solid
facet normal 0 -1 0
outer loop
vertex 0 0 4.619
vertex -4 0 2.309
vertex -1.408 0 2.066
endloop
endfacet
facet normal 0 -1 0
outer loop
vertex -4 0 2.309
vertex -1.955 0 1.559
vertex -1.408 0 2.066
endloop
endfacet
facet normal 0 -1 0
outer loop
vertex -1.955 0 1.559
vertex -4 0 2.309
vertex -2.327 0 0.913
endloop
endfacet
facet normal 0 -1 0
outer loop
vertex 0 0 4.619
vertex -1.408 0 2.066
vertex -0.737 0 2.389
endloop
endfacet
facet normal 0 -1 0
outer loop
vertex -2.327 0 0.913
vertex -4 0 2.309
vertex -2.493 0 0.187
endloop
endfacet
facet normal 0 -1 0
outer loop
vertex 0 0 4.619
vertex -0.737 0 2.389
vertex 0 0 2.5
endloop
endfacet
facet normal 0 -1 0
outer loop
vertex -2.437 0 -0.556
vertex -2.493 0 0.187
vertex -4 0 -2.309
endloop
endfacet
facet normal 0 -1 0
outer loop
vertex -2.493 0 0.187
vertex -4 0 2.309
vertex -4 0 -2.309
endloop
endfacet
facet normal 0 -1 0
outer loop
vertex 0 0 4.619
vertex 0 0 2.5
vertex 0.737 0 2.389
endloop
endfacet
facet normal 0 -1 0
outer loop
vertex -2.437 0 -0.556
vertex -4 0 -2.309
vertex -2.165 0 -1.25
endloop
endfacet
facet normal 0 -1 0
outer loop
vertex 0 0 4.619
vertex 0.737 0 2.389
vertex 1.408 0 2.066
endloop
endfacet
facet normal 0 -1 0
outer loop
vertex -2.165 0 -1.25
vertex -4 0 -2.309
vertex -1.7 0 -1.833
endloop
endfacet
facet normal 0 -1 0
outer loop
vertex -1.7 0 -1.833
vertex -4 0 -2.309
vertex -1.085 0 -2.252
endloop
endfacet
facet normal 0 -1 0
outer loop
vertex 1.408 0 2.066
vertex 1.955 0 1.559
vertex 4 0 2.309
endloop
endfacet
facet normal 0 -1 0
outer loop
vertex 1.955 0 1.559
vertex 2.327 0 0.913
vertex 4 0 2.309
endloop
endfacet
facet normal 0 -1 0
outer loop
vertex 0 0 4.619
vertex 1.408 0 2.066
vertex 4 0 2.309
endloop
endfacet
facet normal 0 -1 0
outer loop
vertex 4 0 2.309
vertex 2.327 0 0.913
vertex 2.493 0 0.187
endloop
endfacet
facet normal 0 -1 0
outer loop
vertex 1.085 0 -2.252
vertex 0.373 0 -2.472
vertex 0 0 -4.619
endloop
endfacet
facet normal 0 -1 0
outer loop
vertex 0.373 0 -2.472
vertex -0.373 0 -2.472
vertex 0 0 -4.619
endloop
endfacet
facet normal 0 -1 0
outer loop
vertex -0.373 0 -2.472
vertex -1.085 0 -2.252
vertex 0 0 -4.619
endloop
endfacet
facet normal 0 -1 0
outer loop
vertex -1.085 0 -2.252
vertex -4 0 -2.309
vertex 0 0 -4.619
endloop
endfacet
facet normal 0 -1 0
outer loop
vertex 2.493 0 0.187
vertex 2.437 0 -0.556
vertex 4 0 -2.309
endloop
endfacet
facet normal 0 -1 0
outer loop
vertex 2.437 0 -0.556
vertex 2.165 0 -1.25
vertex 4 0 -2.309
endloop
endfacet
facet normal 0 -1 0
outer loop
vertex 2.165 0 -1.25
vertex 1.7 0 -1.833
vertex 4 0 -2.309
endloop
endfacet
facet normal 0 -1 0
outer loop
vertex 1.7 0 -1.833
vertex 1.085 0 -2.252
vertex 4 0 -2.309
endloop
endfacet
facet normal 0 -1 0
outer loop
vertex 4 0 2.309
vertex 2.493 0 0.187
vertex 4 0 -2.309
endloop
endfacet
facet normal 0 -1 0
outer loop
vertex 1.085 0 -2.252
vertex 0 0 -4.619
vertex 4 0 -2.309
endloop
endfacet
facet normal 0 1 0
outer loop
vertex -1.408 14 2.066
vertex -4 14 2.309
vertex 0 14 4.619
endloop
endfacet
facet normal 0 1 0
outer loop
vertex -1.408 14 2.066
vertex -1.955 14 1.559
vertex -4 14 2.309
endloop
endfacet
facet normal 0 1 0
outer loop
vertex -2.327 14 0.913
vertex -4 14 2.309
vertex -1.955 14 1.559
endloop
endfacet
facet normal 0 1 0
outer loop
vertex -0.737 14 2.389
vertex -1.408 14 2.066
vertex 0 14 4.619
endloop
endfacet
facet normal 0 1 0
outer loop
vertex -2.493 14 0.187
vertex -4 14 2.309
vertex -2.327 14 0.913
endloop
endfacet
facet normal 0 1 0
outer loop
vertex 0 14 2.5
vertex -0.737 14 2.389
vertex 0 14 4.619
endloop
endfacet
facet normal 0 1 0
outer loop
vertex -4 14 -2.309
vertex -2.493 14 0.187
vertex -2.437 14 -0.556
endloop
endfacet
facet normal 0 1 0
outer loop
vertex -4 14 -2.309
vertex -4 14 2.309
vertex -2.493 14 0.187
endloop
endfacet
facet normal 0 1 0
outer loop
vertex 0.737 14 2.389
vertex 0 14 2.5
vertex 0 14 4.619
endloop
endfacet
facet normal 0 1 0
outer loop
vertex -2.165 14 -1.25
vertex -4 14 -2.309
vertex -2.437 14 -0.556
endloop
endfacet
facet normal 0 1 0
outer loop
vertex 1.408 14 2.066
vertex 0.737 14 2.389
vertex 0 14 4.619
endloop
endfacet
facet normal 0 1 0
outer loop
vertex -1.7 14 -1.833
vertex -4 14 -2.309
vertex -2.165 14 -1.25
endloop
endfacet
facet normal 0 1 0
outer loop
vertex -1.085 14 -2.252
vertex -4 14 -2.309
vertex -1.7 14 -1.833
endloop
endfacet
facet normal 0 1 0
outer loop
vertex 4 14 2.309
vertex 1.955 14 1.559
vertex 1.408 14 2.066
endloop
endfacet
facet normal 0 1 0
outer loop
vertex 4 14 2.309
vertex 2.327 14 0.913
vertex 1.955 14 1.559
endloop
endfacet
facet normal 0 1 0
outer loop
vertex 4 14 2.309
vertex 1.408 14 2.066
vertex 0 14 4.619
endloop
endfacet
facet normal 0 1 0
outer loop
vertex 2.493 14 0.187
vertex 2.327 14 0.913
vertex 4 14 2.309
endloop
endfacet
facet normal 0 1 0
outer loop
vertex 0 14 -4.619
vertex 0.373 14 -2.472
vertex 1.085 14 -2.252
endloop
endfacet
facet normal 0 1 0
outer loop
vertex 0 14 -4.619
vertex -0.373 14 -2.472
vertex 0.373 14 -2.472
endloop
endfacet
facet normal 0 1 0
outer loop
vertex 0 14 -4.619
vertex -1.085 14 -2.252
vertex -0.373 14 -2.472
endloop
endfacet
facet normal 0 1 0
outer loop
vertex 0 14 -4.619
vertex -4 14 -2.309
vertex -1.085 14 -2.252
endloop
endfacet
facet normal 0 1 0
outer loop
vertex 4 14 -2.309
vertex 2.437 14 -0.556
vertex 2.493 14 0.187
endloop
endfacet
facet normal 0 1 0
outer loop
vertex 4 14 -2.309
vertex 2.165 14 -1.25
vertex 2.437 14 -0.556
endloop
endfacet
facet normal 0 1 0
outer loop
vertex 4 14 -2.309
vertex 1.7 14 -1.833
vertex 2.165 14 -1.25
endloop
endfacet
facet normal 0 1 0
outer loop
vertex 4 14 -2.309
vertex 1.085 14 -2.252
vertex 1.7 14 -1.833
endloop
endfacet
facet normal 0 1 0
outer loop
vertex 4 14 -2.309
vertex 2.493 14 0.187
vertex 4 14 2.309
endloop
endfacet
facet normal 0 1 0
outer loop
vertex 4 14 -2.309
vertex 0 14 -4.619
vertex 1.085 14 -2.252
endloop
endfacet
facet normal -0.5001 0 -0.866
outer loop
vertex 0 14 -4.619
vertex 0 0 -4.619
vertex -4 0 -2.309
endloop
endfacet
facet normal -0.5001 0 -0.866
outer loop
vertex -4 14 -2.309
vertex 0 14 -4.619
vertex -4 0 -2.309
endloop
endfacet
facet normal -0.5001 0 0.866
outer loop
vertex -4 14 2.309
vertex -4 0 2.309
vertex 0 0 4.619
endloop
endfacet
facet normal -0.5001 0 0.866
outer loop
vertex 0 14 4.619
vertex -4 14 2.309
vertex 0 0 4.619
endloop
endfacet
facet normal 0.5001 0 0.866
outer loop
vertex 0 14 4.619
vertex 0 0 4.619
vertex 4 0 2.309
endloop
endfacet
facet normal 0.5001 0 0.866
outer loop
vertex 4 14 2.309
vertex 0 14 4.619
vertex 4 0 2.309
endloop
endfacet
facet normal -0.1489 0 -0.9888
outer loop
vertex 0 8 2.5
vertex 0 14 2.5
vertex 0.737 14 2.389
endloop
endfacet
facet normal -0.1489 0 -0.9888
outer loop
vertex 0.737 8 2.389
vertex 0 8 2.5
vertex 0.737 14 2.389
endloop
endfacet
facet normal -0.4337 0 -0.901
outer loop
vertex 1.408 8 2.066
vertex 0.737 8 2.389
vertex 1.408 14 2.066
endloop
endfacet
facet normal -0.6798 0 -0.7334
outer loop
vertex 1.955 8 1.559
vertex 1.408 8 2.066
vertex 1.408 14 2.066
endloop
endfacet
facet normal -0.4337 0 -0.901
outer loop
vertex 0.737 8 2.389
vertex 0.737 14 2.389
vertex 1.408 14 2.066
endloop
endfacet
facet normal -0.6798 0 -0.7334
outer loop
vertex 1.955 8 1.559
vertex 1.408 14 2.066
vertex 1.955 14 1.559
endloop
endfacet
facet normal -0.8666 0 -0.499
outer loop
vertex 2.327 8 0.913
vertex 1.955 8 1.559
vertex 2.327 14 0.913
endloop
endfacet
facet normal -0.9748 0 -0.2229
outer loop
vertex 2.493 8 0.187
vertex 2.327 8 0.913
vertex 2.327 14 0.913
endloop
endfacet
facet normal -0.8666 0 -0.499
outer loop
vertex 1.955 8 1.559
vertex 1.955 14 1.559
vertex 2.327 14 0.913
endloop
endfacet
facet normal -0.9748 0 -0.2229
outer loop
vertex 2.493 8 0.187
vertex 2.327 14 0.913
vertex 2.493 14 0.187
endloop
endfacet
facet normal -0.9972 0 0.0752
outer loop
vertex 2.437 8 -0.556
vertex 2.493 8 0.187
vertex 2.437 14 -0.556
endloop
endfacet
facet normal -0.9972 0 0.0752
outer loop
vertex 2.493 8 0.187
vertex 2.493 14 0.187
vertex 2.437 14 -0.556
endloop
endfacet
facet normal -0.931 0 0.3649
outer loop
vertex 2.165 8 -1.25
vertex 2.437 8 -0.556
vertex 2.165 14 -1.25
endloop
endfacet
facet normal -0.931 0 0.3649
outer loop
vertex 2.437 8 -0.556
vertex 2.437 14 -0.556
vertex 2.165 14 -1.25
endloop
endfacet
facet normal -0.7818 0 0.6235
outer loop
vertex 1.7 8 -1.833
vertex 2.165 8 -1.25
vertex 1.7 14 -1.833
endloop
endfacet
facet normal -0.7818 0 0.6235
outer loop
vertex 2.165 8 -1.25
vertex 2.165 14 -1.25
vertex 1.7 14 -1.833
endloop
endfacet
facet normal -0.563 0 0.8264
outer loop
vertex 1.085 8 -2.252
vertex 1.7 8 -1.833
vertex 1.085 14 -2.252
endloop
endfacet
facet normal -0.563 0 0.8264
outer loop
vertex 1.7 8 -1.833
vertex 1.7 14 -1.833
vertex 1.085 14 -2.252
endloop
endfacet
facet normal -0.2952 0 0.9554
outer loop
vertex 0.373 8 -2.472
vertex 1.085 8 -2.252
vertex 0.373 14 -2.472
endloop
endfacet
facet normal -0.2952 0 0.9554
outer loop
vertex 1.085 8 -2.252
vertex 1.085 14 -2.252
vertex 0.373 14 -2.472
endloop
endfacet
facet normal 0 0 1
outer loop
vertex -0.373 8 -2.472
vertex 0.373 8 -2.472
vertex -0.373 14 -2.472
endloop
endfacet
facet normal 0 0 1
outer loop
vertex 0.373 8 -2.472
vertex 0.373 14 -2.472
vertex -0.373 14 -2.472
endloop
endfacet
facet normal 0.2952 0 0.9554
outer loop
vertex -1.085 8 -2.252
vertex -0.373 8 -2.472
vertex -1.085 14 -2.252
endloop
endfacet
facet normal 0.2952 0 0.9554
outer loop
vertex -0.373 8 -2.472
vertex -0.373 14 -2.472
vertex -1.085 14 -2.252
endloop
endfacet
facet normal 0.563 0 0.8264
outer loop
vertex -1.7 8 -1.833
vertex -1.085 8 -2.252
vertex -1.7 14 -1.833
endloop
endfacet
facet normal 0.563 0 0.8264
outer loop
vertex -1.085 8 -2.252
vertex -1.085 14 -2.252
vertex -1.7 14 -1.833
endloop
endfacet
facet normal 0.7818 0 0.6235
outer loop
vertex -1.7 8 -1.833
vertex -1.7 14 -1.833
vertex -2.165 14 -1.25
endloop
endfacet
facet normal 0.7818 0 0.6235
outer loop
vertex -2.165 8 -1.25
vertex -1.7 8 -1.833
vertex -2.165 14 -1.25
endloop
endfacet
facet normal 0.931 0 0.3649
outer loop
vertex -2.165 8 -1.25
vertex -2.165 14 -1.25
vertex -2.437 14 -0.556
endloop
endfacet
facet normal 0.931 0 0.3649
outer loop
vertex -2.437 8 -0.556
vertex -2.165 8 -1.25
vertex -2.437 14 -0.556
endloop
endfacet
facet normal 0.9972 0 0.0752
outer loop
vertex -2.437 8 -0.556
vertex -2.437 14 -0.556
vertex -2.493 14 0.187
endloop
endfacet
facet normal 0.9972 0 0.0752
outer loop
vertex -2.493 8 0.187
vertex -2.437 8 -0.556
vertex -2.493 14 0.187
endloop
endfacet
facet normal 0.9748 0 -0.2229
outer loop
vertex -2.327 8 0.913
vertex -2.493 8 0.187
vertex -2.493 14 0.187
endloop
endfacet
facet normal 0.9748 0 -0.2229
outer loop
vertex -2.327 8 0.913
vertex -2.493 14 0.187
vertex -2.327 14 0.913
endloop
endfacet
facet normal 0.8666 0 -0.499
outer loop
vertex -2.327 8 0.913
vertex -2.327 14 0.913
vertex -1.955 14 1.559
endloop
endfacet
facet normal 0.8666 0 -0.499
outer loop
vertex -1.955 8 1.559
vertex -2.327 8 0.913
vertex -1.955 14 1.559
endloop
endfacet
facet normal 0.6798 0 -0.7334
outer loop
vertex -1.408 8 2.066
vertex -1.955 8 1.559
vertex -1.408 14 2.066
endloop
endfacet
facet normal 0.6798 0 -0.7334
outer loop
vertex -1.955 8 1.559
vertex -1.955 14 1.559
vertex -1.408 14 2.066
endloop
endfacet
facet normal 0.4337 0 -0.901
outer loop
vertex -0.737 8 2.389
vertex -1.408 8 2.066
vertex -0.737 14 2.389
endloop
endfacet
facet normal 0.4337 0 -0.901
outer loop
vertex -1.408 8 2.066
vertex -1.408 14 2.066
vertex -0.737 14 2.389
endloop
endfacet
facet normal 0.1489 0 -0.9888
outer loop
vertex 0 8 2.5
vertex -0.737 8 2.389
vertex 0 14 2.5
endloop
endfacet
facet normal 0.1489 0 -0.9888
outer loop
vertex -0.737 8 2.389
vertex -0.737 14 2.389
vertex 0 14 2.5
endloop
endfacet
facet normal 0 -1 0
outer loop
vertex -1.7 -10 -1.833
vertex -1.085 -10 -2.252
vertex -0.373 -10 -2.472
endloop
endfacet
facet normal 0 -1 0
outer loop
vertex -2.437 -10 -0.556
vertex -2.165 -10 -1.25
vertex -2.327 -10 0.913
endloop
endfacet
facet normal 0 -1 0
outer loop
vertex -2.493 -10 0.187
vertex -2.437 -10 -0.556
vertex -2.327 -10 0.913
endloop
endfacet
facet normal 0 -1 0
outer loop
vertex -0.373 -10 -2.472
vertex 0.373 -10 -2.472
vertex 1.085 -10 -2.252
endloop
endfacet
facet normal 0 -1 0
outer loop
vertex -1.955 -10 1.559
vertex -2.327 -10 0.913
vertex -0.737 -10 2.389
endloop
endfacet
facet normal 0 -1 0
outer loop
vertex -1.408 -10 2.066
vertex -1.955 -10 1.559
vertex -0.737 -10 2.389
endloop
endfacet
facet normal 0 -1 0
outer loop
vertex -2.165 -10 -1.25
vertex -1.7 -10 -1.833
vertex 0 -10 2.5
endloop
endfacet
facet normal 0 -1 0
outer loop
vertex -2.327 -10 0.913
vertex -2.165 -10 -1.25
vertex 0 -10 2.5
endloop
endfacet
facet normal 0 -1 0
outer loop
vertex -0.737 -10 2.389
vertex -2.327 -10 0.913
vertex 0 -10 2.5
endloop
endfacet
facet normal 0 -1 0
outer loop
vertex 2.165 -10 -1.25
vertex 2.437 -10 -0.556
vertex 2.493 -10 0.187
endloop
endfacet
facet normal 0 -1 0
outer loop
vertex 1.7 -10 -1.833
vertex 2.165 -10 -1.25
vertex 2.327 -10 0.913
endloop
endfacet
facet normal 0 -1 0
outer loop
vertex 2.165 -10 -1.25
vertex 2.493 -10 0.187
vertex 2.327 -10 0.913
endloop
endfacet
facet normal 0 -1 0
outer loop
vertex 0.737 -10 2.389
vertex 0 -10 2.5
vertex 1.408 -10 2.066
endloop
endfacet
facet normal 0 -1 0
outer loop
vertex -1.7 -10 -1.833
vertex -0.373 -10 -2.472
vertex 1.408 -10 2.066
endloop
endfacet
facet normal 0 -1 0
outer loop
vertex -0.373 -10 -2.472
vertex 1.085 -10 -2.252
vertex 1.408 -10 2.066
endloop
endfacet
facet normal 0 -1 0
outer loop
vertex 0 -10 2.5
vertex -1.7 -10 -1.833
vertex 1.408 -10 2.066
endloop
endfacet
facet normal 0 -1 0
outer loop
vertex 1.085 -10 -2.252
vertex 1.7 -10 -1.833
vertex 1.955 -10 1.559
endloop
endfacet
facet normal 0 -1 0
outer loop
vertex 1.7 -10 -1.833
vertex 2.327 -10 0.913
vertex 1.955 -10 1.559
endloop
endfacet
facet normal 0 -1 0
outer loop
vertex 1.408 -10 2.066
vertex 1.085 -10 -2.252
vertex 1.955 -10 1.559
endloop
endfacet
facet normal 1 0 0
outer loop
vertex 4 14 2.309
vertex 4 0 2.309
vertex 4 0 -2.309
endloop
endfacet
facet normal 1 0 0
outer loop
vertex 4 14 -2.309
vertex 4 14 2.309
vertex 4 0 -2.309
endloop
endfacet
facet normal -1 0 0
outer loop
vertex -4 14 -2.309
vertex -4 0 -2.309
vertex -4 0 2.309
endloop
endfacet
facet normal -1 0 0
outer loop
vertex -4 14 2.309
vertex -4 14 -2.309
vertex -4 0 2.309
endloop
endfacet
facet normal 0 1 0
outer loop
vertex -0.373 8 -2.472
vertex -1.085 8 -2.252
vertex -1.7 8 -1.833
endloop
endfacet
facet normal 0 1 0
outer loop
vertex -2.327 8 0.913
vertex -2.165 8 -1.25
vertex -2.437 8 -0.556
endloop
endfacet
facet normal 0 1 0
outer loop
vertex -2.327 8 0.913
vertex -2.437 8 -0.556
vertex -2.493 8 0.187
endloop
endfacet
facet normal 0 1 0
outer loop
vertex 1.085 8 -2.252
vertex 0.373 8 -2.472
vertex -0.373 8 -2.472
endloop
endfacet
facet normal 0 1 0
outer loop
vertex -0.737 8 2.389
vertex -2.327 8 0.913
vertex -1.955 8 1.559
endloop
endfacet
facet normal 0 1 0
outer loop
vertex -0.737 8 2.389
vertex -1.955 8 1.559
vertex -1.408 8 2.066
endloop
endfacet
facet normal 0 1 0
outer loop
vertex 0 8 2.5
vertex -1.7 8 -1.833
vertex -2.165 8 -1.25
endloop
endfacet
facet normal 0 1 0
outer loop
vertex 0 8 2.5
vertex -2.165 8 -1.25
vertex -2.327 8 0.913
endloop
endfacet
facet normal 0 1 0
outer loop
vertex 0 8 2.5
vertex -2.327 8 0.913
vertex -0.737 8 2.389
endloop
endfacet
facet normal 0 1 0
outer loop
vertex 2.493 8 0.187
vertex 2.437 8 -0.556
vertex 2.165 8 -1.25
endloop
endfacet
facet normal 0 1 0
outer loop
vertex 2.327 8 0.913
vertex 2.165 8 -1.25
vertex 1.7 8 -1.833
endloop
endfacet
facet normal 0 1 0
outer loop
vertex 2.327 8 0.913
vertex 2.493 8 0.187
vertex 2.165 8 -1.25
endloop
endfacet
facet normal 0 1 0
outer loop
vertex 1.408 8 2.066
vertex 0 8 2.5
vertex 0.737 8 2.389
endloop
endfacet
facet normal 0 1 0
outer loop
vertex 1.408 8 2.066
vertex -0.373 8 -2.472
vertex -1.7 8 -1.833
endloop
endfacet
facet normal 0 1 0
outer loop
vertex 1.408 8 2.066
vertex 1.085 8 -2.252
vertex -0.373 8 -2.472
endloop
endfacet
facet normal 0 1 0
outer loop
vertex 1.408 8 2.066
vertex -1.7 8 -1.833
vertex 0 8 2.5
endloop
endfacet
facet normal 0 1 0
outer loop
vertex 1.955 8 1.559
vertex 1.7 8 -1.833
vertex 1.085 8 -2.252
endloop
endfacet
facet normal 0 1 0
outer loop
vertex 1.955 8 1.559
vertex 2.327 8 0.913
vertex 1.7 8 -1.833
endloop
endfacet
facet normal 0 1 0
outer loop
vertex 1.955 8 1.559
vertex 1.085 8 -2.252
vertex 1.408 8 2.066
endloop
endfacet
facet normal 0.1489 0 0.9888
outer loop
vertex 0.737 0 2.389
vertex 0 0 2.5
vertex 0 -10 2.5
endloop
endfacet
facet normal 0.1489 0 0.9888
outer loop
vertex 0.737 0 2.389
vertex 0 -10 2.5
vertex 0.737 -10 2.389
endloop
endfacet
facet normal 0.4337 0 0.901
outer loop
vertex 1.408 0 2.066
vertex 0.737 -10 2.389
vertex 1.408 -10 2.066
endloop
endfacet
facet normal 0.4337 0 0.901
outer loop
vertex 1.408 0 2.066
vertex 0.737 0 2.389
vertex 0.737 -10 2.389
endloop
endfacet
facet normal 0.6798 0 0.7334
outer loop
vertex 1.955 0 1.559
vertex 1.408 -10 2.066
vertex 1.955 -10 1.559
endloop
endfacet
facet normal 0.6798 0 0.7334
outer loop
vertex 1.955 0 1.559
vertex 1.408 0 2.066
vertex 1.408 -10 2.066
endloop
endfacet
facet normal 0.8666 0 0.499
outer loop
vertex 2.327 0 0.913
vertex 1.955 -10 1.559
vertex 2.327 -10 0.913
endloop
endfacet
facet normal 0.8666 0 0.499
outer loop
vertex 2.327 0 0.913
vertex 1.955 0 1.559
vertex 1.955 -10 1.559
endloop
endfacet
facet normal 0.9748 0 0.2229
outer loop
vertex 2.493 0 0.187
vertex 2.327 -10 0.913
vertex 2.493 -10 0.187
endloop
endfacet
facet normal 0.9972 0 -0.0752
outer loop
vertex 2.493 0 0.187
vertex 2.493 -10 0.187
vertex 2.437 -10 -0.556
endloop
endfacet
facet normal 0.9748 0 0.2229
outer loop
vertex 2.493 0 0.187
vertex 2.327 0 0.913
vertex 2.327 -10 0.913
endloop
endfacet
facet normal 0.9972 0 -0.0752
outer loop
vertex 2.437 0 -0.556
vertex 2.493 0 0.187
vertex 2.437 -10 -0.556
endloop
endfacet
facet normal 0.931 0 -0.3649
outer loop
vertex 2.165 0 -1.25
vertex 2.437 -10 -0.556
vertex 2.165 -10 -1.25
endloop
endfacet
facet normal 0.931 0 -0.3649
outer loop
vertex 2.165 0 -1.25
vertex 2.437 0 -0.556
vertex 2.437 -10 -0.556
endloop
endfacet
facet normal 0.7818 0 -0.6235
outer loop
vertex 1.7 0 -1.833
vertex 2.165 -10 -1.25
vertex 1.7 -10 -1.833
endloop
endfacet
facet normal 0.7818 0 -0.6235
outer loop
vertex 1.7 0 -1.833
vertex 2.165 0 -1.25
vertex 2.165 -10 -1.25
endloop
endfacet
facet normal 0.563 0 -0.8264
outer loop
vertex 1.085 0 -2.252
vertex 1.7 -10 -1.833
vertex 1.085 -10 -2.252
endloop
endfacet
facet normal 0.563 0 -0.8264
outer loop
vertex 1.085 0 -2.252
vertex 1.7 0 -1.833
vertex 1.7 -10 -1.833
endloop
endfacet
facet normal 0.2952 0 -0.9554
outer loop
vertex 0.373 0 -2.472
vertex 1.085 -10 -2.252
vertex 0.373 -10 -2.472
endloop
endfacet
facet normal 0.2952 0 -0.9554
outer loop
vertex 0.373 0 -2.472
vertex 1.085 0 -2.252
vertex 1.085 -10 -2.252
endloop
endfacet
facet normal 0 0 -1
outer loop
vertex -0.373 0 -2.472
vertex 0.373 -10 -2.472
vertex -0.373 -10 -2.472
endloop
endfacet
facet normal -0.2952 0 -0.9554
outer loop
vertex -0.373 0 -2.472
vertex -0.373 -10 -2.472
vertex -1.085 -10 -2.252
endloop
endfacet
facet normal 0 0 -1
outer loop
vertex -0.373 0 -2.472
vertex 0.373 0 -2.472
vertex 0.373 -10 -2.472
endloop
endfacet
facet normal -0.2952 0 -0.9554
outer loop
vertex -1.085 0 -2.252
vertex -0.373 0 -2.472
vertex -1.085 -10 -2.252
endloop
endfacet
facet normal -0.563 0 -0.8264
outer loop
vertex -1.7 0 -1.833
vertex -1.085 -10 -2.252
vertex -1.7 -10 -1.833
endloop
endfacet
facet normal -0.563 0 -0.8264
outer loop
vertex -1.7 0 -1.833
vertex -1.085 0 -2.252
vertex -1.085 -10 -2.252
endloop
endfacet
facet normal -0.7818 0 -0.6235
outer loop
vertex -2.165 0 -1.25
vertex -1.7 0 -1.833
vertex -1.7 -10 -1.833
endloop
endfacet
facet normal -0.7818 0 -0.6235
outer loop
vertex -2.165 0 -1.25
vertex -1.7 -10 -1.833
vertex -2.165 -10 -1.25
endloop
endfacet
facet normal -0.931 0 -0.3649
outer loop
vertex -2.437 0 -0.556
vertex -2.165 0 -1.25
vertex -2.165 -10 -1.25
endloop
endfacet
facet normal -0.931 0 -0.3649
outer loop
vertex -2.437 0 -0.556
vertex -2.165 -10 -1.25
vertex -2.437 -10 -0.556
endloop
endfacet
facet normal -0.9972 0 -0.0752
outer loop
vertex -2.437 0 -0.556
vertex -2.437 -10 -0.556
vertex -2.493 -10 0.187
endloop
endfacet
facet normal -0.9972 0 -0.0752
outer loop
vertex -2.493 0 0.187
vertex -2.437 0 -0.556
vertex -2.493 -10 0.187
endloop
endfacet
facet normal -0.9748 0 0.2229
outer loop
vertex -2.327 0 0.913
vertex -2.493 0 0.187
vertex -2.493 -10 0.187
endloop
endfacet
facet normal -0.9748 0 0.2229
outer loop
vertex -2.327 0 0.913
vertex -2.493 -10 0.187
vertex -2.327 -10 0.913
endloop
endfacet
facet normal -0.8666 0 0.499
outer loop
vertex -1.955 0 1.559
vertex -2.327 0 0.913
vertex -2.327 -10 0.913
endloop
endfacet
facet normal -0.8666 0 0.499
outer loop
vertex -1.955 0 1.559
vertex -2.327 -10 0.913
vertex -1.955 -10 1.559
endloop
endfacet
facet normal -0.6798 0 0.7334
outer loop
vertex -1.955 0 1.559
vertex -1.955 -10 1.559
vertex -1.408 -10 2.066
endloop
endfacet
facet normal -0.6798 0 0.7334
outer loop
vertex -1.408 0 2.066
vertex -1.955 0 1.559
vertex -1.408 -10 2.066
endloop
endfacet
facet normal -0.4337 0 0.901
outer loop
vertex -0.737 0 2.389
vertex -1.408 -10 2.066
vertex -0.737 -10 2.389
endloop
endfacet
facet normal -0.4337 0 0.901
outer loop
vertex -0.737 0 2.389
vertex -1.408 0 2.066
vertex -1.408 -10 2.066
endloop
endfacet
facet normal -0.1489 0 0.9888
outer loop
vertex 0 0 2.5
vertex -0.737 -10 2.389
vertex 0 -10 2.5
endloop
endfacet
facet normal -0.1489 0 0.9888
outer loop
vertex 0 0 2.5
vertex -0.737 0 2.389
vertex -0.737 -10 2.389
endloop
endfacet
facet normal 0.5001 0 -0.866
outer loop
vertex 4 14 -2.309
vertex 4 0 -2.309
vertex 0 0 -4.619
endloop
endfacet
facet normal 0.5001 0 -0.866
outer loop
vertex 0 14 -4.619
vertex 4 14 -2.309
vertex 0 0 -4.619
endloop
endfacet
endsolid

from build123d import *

# Parameters (mm, degrees)
BOSS_EXTRUDE1_DEPTH = 14
SKETCH1_3_R         = 2.5
BOSS_EXTRUDE2_DEPTH = 10
SKETCH3_R           = 2.5
CUT_EXTRUDE1_DEPTH  = 6


with BuildPart() as part:
    # Sketch1 → Boss-Extrude1 (new body)
    with BuildSketch(Plane(origin=(0, 0, 0), x_dir=(1, 0, 0), z_dir=(0, 1, 0))):
        Polygon((0, 4.618802154), (-4, 2.309401077), (-4, -2.309401077), (0, -4.618802154), (4, -2.309401077), (4, 2.309401077), align=None)
    extrude(amount=BOSS_EXTRUDE1_DEPTH)

    # Sketch1<3> → Boss-Extrude2 (add)
    with BuildSketch(Plane(origin=(0, 0, 0), x_dir=(1, 0, 0), z_dir=(0, 1, 0))):
        Circle(SKETCH1_3_R)
    extrude(amount=-BOSS_EXTRUDE2_DEPTH)

    # Sketch3 → Cut-Extrude1 (cut)
    with BuildSketch(Plane(origin=(0, 14, 0), x_dir=(1, 0, 0), z_dir=(0, 1, 0))):
        Circle(SKETCH3_R)
    extrude(amount=-CUT_EXTRUDE1_DEPTH, mode=Mode.SUBTRACT)


solid = part.part
